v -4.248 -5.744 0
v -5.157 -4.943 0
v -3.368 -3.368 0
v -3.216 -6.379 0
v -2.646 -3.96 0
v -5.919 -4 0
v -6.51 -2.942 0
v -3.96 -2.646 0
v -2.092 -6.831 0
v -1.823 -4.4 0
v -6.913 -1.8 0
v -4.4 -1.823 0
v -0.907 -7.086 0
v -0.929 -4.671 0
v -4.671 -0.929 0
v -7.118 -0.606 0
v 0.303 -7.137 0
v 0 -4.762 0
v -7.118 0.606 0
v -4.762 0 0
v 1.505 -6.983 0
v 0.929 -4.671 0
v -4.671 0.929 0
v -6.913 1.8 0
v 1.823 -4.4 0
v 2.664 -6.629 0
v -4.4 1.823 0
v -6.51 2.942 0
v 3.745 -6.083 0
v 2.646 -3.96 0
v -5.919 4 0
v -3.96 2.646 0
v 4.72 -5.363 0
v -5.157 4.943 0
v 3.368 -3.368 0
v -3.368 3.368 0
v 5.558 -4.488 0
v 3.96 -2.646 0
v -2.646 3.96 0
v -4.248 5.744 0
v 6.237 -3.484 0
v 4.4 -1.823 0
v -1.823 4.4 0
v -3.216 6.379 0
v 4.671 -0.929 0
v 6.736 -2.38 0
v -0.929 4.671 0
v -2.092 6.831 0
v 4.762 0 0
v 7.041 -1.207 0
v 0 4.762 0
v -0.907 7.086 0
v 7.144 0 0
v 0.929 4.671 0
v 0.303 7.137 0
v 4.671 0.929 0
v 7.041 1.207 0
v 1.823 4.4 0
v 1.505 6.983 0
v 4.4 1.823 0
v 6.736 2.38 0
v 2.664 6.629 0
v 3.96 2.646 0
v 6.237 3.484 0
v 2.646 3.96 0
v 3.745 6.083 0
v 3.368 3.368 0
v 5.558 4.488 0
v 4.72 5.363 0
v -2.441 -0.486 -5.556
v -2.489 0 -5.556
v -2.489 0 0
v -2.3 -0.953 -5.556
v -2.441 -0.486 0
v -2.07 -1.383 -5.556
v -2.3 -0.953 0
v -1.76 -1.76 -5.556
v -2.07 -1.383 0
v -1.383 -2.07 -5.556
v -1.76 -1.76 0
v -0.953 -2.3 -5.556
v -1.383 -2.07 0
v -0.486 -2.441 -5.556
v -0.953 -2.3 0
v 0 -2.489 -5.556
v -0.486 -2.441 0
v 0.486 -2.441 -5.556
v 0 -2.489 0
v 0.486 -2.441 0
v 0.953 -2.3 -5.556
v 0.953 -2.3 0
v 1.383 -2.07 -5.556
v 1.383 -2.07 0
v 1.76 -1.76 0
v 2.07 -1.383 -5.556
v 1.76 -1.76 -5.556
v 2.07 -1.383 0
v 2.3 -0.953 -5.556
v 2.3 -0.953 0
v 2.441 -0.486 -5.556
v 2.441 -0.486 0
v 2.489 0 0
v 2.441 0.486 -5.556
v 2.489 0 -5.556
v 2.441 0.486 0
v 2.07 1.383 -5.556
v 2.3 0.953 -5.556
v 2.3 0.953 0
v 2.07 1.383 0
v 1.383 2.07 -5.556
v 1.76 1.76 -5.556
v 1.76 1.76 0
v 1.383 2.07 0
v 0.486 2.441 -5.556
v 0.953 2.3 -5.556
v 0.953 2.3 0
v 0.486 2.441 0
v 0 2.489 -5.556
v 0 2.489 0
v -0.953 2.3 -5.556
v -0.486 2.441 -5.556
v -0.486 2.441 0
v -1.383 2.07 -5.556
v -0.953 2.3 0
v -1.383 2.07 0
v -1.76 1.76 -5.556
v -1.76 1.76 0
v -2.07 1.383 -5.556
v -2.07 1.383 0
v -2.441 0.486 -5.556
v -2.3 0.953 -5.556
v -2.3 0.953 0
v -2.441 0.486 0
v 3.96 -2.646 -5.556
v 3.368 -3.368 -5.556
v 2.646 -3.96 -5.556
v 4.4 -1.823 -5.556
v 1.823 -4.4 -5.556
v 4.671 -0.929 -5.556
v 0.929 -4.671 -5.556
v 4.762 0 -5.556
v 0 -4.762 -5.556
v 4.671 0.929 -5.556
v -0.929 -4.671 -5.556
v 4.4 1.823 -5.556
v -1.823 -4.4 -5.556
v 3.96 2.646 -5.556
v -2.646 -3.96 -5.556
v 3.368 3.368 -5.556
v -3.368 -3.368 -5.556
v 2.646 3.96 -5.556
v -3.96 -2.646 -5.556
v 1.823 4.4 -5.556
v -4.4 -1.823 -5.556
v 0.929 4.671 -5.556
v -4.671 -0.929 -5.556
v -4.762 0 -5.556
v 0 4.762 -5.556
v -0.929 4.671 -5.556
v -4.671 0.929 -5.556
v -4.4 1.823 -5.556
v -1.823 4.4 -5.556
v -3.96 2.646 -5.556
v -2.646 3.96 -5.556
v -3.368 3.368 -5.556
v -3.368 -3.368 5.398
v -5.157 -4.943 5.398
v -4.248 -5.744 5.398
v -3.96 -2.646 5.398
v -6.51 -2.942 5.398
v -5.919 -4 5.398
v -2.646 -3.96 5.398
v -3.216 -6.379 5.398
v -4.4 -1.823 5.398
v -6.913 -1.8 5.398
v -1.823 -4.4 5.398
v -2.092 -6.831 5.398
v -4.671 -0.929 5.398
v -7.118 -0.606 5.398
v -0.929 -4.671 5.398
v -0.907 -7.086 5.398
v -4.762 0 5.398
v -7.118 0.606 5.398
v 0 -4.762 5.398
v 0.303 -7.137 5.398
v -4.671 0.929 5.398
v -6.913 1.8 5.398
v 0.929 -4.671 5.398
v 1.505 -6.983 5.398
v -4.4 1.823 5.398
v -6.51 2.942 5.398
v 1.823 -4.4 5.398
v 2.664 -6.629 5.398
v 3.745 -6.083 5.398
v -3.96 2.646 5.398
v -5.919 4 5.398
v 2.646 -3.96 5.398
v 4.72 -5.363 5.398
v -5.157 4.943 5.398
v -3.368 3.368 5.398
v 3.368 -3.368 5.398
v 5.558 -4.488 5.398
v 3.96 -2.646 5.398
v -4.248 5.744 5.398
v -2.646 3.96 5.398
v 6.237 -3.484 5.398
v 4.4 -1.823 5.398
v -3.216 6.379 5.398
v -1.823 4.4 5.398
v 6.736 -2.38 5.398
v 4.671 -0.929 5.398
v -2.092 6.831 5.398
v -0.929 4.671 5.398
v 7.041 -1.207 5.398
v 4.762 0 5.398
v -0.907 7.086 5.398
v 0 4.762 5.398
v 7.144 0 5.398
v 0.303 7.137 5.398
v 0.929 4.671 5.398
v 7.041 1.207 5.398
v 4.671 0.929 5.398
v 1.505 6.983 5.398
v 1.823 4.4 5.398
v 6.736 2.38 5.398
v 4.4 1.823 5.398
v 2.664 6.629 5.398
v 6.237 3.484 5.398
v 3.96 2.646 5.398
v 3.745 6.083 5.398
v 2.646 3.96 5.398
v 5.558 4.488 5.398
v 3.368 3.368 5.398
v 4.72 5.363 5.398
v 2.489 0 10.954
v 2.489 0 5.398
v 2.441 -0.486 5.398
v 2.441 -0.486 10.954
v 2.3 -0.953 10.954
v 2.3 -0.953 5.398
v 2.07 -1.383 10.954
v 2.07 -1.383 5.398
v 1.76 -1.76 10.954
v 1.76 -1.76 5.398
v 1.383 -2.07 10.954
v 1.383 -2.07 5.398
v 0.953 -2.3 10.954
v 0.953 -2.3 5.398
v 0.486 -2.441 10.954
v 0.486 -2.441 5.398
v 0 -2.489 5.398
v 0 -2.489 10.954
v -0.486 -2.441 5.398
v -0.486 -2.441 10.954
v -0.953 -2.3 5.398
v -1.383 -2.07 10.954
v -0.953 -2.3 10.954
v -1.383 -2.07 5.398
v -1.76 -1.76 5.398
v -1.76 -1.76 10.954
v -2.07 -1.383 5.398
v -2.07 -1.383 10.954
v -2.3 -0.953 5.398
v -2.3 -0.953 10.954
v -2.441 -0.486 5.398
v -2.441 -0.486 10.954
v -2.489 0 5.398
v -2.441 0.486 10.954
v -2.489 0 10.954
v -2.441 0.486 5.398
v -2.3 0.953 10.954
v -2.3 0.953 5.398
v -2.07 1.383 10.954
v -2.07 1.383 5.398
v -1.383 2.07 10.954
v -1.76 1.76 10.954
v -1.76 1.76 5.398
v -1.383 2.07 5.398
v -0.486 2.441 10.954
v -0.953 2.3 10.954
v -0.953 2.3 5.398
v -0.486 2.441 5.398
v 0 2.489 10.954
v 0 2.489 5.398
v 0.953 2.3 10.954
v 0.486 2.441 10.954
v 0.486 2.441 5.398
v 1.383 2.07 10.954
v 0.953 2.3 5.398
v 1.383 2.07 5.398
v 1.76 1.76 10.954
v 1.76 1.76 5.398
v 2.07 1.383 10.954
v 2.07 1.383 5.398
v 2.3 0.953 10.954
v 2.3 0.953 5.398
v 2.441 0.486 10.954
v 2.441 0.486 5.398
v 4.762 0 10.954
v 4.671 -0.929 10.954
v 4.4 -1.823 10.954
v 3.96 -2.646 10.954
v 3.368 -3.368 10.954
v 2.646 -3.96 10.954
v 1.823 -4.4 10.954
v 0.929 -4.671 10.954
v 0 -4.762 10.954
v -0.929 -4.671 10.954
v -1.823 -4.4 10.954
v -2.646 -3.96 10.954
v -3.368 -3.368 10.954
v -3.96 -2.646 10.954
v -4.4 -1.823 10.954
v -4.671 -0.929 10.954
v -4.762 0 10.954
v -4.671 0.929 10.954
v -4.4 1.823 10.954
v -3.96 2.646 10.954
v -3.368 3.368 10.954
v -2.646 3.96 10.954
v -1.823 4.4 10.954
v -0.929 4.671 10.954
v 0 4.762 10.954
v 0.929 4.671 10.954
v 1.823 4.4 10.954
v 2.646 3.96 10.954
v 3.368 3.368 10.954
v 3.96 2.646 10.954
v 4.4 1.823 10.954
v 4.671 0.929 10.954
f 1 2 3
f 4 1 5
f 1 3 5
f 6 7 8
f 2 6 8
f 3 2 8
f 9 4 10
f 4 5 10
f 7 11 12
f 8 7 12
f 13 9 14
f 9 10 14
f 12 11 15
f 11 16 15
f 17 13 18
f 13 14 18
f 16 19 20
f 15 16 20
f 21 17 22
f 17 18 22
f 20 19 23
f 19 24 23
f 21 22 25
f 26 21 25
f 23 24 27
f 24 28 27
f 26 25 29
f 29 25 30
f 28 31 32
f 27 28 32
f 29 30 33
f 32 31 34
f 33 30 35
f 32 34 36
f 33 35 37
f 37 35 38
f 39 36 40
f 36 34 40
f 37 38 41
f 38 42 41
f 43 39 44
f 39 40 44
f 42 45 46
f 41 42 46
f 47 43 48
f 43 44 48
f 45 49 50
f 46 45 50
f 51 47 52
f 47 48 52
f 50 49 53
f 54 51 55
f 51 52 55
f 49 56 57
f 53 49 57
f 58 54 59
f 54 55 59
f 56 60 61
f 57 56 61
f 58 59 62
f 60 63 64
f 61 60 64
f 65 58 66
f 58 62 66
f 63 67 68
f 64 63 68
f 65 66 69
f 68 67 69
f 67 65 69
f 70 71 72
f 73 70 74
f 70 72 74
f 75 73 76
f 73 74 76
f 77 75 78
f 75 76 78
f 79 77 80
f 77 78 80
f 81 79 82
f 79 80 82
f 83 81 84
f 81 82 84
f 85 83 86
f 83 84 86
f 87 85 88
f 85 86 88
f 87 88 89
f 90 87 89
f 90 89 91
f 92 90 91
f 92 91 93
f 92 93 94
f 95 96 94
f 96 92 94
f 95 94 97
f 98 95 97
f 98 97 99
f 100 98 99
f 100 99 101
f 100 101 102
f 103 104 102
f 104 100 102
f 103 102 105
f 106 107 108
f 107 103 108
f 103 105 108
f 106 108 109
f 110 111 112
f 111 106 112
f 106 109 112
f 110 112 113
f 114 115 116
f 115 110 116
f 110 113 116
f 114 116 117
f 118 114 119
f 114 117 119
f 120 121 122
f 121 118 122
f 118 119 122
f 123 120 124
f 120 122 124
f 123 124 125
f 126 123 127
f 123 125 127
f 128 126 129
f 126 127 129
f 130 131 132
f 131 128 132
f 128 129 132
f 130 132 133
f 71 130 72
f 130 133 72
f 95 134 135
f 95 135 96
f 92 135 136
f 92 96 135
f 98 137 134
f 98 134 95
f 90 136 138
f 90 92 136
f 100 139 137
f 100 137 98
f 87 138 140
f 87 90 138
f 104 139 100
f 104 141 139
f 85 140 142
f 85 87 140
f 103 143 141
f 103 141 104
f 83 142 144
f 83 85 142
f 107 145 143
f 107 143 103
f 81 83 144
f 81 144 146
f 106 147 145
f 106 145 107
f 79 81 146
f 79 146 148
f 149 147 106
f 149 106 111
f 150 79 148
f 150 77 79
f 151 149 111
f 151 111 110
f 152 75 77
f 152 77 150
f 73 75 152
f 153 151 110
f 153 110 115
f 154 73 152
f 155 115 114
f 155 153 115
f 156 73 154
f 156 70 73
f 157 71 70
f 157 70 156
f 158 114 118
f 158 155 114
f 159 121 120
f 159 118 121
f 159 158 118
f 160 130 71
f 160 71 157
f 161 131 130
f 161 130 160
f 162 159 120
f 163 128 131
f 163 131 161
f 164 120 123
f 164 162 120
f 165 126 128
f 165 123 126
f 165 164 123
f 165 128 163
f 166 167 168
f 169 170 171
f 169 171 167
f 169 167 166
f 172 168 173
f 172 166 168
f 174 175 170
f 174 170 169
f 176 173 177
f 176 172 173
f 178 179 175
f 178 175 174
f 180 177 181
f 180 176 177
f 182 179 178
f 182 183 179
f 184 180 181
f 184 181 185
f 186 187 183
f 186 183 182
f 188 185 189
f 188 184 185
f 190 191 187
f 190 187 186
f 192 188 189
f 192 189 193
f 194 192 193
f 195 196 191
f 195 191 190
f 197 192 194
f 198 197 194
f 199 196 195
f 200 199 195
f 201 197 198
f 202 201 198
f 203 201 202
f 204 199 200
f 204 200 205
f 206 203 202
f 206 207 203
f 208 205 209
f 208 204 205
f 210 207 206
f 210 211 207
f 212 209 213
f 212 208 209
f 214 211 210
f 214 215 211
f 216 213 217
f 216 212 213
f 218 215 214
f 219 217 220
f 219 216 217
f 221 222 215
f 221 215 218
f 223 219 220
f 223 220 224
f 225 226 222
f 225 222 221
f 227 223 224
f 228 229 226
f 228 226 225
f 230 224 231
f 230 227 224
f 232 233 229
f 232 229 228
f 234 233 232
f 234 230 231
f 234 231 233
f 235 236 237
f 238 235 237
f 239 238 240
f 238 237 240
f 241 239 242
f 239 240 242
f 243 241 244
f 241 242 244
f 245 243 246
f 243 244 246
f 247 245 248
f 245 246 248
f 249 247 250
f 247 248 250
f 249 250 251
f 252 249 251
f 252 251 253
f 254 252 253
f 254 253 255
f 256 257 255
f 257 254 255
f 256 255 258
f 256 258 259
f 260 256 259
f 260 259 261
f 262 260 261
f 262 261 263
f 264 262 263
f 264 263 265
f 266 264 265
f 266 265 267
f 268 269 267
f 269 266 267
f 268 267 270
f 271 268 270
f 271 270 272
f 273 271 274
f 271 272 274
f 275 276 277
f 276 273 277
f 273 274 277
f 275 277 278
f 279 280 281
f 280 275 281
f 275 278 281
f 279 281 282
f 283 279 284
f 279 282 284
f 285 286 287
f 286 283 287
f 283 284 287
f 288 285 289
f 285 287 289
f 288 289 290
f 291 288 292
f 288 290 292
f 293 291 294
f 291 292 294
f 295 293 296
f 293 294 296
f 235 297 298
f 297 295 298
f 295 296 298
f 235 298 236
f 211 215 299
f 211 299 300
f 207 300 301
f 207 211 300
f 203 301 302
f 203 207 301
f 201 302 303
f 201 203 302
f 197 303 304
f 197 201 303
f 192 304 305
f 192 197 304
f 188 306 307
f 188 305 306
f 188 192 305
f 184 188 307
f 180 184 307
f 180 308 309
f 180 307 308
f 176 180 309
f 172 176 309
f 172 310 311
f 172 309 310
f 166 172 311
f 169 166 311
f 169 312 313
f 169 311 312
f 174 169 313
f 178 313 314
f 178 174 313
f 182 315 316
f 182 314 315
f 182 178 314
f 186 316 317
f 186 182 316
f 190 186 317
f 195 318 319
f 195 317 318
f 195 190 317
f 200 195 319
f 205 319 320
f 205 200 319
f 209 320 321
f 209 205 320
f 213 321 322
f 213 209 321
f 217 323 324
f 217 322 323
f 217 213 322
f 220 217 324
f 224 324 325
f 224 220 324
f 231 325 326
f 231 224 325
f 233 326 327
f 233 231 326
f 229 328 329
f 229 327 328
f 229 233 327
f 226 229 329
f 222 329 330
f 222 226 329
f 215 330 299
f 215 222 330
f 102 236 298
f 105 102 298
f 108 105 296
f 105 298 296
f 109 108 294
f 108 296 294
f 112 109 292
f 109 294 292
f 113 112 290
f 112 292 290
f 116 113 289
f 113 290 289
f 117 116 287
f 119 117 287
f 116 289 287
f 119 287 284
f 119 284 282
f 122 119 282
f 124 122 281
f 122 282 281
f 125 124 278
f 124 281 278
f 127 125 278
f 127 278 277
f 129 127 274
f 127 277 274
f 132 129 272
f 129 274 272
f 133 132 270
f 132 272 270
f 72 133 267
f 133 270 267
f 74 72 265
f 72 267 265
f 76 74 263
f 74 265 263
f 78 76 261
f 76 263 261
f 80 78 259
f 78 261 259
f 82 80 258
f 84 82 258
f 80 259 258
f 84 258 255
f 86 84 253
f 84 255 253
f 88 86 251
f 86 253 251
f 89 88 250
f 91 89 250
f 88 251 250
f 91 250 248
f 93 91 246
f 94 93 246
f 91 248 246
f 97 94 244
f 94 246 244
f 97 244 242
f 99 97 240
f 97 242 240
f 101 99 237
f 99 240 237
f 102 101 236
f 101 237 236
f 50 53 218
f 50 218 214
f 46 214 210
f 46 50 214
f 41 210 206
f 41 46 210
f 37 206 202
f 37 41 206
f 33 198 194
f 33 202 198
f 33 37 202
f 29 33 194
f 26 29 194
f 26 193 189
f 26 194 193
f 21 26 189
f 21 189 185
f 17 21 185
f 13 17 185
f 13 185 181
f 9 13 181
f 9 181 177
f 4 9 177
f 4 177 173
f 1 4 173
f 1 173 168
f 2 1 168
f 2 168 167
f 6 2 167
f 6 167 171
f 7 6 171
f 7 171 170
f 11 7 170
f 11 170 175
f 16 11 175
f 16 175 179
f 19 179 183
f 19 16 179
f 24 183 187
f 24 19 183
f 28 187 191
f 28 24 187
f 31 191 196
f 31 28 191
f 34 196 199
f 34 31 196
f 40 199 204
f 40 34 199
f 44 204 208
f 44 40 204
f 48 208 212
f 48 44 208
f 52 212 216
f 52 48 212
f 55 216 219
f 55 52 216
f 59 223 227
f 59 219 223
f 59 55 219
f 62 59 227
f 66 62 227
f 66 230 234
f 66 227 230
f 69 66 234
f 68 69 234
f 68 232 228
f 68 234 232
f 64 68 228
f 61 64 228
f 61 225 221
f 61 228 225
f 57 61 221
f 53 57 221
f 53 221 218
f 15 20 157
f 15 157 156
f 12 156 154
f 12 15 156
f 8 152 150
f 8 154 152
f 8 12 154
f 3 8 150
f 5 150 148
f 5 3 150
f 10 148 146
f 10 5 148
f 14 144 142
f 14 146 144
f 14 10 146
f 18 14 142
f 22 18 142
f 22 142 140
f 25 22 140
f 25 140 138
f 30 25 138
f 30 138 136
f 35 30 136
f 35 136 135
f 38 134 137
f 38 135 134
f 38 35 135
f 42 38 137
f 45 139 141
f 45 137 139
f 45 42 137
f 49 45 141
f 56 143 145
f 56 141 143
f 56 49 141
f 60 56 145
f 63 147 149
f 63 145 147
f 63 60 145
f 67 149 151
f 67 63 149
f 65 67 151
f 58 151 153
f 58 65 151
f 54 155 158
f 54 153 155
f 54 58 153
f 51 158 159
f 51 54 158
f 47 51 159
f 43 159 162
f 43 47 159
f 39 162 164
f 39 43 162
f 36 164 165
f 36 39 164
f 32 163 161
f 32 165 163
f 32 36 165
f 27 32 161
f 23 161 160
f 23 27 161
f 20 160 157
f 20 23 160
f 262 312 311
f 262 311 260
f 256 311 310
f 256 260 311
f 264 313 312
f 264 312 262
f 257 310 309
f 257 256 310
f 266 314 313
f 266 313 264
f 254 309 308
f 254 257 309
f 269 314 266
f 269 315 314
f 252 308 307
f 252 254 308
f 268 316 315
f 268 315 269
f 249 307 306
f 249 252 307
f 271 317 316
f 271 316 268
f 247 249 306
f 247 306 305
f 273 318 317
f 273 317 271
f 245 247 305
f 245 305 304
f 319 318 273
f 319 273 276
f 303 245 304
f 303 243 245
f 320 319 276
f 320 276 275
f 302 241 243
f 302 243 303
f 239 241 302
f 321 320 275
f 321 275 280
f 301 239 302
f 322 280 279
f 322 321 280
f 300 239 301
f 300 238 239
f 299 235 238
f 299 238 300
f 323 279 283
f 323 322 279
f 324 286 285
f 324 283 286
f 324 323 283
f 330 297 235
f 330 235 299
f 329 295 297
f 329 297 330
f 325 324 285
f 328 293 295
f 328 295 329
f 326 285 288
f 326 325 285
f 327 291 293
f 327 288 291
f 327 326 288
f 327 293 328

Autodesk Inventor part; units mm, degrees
ref_plane "YZ Plane" through (0, 0, 0) normal (1, 0, 0) x (0, 1, 0)
ref_plane "XZ Plane" through (0, 0, 0) normal (0, 1, 0) x (-1, 0, 0)
sketch "Sketch1" plane through (0, 0, 0) normal (0, 0, 1) x (1, 0, 0)
  circle A0 centre (0, 0) radius 7.1437
  dimension "d0" = 14.2875
extrude "Extrusion1" add sketch "Sketch1" along normal blind 5.3975
ref_plane "Work Plane1" through (0, 0, 6.35) normal (0, 0, 1) x (1, 0, 0)
sketch "Sketch6" plane through (0, 0, 5.3975) normal (0, 0, 1) x (1, 0, 0)
  circle A0 centre (0, 0) radius 2.4892
  dimension "d28" = 4.9784
extrude "Extrusion3" cut sketch "Sketch6" against normal through all
sketch "Sketch7" plane through (0, 0, 5.3975) normal (0, 0, 1) x (1, 0, 0)
  circle A0 centre (0, 0) radius 4.7625
  circle A1 centre (0, 0) radius 2.4892
  dimension "d31" = 9.525
  dimension "d32" = 4.9784
extrude "Extrusion4" add sketch "Sketch7" along normal blind 5.5563
sketch "Sketch8" plane through (0, 0, 0) normal (0, 0, -1) x (-1, 0, 0)
  circle A0 centre (0, 0) radius 2.4892 projected
  circle A1 centre (0, 0) radius 4.7625 projected
extrude "Extrusion5" add sketch "Sketch8" along normal blind 5.5563
ref_plane "Work Plane2" through (0, 0, 2.6987) normal (0, 0, 1) x (1, 0, 0)
properties part number "RollerSpacer2(Bearing)"
